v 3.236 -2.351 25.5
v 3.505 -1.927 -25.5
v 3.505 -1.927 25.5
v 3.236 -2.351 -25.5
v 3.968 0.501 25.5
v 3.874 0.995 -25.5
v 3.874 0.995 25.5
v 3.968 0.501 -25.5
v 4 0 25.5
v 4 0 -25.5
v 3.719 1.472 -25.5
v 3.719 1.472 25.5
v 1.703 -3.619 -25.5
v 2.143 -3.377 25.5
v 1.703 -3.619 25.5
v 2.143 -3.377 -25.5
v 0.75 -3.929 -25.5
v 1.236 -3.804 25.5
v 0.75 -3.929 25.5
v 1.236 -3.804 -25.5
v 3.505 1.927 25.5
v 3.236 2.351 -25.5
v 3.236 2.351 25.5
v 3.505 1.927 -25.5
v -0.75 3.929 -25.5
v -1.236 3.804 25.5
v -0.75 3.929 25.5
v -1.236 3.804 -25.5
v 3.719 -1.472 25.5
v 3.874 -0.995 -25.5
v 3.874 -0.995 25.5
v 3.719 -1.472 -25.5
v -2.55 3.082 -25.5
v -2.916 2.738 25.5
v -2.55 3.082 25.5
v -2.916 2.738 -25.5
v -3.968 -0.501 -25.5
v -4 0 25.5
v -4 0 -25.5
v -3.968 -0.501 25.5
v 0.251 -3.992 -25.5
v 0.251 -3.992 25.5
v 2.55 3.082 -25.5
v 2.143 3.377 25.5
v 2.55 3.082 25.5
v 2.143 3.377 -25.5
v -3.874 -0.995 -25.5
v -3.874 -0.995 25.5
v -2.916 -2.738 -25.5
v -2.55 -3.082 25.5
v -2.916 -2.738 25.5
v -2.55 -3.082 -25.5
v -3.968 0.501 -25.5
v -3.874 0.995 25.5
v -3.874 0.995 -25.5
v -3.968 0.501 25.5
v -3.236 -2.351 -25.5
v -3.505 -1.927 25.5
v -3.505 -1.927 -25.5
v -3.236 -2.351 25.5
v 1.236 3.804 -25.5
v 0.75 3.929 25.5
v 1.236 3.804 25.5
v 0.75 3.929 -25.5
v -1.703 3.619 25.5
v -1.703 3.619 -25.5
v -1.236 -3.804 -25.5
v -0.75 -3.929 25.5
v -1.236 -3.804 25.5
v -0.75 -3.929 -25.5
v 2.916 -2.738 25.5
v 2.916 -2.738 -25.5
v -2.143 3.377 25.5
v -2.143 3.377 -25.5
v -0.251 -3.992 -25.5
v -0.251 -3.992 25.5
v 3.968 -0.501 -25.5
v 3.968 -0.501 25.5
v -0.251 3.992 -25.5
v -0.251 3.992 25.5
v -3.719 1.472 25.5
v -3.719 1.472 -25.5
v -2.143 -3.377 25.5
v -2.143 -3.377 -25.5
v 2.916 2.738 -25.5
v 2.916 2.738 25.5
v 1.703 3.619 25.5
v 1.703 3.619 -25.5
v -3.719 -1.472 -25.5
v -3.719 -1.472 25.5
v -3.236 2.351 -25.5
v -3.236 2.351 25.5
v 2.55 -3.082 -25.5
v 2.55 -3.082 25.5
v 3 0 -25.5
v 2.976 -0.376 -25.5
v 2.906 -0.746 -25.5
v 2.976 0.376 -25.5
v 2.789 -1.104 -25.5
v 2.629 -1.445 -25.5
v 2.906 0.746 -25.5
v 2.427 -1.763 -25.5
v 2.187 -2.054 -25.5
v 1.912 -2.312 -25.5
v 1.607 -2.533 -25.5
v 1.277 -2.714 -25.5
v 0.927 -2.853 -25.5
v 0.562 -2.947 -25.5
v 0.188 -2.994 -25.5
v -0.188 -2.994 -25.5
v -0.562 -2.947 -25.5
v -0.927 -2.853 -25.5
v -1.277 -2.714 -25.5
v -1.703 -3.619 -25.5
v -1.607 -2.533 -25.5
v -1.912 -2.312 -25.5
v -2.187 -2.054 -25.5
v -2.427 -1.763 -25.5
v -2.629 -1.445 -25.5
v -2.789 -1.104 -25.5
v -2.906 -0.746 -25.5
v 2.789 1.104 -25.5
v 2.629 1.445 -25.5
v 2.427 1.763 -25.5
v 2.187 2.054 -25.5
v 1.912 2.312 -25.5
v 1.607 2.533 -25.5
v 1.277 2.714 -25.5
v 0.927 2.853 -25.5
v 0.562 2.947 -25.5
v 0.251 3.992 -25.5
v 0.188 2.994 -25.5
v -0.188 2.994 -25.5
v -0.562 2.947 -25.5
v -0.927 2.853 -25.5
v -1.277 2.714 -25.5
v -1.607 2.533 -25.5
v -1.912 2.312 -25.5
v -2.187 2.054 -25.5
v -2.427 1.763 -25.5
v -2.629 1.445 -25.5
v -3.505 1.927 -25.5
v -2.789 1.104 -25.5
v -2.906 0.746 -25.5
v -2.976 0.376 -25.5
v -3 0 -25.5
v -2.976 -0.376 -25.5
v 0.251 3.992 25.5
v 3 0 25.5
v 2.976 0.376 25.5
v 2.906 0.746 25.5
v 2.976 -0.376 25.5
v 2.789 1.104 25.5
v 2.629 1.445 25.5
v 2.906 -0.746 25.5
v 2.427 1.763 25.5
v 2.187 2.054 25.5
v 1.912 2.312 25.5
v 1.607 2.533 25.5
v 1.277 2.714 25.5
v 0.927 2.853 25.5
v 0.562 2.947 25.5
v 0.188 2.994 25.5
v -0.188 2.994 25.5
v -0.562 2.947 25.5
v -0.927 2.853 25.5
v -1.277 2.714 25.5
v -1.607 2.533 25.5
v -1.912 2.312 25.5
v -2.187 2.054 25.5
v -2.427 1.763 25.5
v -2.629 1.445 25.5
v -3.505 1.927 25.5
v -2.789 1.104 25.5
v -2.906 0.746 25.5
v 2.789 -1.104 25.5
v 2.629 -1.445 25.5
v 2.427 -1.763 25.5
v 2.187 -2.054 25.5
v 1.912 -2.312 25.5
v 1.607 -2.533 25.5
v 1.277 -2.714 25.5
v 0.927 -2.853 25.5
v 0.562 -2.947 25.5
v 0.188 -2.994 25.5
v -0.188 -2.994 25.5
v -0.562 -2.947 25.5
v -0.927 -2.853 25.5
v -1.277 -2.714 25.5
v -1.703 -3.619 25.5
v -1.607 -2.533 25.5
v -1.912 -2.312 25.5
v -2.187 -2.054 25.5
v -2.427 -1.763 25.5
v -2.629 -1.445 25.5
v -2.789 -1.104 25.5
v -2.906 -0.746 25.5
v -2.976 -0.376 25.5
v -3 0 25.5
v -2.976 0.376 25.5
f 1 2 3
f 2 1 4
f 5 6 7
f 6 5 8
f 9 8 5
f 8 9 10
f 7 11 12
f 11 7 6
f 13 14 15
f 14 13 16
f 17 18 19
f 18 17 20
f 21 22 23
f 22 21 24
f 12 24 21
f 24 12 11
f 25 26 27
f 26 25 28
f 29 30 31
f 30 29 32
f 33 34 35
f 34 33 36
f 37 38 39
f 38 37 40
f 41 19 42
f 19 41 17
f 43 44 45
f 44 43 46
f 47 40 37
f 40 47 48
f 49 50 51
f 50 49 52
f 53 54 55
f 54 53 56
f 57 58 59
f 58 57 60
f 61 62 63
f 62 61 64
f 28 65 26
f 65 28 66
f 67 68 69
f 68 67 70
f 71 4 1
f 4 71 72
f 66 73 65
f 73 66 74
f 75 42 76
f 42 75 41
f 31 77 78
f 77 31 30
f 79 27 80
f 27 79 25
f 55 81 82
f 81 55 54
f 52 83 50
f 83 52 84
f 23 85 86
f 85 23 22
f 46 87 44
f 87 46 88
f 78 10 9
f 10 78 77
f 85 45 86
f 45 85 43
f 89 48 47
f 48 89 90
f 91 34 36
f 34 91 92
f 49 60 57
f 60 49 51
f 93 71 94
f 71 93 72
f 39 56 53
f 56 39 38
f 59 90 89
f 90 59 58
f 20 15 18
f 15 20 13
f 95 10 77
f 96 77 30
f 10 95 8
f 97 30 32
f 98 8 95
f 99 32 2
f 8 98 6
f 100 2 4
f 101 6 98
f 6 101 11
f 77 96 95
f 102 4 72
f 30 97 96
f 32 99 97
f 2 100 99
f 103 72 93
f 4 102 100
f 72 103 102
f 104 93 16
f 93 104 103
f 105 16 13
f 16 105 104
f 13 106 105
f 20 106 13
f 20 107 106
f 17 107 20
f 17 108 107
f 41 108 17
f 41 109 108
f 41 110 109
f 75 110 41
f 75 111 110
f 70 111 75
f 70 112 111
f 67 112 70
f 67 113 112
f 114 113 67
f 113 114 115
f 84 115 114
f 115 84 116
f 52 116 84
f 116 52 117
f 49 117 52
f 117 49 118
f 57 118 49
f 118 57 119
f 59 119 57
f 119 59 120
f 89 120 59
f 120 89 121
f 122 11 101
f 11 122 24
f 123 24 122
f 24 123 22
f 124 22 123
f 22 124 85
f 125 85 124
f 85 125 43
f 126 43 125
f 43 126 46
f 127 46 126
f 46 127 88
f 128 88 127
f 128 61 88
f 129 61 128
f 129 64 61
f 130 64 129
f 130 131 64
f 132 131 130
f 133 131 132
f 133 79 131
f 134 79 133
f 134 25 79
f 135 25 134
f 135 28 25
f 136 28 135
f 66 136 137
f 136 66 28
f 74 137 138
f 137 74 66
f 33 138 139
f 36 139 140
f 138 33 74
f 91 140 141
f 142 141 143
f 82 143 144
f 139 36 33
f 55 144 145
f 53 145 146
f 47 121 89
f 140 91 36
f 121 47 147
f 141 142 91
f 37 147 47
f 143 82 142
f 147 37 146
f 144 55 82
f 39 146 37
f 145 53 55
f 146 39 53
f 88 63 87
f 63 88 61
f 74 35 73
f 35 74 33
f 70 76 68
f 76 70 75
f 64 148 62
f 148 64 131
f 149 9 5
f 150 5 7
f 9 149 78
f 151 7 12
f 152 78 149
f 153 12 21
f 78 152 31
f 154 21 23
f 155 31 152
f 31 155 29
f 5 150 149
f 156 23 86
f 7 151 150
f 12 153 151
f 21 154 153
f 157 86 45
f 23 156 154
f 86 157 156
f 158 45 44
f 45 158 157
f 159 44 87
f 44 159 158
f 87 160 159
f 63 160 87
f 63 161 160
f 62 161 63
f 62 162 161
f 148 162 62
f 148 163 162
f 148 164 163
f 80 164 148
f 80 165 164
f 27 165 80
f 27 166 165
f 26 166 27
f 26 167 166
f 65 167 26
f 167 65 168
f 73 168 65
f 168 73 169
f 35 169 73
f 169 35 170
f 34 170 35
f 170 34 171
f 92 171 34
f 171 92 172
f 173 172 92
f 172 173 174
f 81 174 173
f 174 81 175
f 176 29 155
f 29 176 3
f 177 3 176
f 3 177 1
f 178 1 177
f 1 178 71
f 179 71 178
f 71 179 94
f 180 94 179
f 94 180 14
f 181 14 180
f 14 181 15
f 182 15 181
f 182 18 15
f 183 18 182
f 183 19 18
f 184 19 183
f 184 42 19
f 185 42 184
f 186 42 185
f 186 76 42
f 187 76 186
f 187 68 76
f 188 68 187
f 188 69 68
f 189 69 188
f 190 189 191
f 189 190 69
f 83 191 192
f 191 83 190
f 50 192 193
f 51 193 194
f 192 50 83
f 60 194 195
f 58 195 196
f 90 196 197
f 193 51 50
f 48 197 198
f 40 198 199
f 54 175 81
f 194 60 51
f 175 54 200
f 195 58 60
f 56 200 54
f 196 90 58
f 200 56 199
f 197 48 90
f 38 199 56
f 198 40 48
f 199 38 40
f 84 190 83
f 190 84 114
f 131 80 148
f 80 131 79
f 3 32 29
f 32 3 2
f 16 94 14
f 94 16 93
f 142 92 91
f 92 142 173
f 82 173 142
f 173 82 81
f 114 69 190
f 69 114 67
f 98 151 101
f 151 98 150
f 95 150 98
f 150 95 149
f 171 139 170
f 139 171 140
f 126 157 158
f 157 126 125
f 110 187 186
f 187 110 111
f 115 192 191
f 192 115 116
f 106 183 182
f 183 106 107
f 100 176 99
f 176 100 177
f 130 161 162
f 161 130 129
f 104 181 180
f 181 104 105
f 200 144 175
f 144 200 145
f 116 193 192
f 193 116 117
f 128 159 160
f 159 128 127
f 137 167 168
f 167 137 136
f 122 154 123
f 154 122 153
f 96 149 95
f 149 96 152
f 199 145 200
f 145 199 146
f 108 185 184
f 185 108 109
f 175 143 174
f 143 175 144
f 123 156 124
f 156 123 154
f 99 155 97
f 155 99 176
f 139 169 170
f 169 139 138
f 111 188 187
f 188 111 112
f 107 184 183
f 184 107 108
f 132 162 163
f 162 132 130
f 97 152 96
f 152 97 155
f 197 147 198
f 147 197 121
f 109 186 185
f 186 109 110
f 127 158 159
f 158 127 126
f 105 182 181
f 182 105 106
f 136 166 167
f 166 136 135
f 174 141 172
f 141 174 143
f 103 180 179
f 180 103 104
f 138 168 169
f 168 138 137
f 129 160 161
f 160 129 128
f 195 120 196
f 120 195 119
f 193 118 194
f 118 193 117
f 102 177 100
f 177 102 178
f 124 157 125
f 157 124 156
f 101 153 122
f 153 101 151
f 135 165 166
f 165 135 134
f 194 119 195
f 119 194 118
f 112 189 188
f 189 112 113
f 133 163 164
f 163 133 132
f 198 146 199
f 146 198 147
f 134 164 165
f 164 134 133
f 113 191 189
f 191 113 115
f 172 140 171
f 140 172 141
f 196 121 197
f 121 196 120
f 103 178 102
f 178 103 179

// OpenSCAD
$fn = 50;


difference() {
	union() {
		translate(v = [0, 0, -25.5000000000]) {
			cylinder(h = 51, r = 4.0000000000);
		}
	}
	union() {
		translate(v = [0, 0, -100.0000000000]) {
			cylinder(h = 200, r = 3.0000000000);
		}
	}
}
